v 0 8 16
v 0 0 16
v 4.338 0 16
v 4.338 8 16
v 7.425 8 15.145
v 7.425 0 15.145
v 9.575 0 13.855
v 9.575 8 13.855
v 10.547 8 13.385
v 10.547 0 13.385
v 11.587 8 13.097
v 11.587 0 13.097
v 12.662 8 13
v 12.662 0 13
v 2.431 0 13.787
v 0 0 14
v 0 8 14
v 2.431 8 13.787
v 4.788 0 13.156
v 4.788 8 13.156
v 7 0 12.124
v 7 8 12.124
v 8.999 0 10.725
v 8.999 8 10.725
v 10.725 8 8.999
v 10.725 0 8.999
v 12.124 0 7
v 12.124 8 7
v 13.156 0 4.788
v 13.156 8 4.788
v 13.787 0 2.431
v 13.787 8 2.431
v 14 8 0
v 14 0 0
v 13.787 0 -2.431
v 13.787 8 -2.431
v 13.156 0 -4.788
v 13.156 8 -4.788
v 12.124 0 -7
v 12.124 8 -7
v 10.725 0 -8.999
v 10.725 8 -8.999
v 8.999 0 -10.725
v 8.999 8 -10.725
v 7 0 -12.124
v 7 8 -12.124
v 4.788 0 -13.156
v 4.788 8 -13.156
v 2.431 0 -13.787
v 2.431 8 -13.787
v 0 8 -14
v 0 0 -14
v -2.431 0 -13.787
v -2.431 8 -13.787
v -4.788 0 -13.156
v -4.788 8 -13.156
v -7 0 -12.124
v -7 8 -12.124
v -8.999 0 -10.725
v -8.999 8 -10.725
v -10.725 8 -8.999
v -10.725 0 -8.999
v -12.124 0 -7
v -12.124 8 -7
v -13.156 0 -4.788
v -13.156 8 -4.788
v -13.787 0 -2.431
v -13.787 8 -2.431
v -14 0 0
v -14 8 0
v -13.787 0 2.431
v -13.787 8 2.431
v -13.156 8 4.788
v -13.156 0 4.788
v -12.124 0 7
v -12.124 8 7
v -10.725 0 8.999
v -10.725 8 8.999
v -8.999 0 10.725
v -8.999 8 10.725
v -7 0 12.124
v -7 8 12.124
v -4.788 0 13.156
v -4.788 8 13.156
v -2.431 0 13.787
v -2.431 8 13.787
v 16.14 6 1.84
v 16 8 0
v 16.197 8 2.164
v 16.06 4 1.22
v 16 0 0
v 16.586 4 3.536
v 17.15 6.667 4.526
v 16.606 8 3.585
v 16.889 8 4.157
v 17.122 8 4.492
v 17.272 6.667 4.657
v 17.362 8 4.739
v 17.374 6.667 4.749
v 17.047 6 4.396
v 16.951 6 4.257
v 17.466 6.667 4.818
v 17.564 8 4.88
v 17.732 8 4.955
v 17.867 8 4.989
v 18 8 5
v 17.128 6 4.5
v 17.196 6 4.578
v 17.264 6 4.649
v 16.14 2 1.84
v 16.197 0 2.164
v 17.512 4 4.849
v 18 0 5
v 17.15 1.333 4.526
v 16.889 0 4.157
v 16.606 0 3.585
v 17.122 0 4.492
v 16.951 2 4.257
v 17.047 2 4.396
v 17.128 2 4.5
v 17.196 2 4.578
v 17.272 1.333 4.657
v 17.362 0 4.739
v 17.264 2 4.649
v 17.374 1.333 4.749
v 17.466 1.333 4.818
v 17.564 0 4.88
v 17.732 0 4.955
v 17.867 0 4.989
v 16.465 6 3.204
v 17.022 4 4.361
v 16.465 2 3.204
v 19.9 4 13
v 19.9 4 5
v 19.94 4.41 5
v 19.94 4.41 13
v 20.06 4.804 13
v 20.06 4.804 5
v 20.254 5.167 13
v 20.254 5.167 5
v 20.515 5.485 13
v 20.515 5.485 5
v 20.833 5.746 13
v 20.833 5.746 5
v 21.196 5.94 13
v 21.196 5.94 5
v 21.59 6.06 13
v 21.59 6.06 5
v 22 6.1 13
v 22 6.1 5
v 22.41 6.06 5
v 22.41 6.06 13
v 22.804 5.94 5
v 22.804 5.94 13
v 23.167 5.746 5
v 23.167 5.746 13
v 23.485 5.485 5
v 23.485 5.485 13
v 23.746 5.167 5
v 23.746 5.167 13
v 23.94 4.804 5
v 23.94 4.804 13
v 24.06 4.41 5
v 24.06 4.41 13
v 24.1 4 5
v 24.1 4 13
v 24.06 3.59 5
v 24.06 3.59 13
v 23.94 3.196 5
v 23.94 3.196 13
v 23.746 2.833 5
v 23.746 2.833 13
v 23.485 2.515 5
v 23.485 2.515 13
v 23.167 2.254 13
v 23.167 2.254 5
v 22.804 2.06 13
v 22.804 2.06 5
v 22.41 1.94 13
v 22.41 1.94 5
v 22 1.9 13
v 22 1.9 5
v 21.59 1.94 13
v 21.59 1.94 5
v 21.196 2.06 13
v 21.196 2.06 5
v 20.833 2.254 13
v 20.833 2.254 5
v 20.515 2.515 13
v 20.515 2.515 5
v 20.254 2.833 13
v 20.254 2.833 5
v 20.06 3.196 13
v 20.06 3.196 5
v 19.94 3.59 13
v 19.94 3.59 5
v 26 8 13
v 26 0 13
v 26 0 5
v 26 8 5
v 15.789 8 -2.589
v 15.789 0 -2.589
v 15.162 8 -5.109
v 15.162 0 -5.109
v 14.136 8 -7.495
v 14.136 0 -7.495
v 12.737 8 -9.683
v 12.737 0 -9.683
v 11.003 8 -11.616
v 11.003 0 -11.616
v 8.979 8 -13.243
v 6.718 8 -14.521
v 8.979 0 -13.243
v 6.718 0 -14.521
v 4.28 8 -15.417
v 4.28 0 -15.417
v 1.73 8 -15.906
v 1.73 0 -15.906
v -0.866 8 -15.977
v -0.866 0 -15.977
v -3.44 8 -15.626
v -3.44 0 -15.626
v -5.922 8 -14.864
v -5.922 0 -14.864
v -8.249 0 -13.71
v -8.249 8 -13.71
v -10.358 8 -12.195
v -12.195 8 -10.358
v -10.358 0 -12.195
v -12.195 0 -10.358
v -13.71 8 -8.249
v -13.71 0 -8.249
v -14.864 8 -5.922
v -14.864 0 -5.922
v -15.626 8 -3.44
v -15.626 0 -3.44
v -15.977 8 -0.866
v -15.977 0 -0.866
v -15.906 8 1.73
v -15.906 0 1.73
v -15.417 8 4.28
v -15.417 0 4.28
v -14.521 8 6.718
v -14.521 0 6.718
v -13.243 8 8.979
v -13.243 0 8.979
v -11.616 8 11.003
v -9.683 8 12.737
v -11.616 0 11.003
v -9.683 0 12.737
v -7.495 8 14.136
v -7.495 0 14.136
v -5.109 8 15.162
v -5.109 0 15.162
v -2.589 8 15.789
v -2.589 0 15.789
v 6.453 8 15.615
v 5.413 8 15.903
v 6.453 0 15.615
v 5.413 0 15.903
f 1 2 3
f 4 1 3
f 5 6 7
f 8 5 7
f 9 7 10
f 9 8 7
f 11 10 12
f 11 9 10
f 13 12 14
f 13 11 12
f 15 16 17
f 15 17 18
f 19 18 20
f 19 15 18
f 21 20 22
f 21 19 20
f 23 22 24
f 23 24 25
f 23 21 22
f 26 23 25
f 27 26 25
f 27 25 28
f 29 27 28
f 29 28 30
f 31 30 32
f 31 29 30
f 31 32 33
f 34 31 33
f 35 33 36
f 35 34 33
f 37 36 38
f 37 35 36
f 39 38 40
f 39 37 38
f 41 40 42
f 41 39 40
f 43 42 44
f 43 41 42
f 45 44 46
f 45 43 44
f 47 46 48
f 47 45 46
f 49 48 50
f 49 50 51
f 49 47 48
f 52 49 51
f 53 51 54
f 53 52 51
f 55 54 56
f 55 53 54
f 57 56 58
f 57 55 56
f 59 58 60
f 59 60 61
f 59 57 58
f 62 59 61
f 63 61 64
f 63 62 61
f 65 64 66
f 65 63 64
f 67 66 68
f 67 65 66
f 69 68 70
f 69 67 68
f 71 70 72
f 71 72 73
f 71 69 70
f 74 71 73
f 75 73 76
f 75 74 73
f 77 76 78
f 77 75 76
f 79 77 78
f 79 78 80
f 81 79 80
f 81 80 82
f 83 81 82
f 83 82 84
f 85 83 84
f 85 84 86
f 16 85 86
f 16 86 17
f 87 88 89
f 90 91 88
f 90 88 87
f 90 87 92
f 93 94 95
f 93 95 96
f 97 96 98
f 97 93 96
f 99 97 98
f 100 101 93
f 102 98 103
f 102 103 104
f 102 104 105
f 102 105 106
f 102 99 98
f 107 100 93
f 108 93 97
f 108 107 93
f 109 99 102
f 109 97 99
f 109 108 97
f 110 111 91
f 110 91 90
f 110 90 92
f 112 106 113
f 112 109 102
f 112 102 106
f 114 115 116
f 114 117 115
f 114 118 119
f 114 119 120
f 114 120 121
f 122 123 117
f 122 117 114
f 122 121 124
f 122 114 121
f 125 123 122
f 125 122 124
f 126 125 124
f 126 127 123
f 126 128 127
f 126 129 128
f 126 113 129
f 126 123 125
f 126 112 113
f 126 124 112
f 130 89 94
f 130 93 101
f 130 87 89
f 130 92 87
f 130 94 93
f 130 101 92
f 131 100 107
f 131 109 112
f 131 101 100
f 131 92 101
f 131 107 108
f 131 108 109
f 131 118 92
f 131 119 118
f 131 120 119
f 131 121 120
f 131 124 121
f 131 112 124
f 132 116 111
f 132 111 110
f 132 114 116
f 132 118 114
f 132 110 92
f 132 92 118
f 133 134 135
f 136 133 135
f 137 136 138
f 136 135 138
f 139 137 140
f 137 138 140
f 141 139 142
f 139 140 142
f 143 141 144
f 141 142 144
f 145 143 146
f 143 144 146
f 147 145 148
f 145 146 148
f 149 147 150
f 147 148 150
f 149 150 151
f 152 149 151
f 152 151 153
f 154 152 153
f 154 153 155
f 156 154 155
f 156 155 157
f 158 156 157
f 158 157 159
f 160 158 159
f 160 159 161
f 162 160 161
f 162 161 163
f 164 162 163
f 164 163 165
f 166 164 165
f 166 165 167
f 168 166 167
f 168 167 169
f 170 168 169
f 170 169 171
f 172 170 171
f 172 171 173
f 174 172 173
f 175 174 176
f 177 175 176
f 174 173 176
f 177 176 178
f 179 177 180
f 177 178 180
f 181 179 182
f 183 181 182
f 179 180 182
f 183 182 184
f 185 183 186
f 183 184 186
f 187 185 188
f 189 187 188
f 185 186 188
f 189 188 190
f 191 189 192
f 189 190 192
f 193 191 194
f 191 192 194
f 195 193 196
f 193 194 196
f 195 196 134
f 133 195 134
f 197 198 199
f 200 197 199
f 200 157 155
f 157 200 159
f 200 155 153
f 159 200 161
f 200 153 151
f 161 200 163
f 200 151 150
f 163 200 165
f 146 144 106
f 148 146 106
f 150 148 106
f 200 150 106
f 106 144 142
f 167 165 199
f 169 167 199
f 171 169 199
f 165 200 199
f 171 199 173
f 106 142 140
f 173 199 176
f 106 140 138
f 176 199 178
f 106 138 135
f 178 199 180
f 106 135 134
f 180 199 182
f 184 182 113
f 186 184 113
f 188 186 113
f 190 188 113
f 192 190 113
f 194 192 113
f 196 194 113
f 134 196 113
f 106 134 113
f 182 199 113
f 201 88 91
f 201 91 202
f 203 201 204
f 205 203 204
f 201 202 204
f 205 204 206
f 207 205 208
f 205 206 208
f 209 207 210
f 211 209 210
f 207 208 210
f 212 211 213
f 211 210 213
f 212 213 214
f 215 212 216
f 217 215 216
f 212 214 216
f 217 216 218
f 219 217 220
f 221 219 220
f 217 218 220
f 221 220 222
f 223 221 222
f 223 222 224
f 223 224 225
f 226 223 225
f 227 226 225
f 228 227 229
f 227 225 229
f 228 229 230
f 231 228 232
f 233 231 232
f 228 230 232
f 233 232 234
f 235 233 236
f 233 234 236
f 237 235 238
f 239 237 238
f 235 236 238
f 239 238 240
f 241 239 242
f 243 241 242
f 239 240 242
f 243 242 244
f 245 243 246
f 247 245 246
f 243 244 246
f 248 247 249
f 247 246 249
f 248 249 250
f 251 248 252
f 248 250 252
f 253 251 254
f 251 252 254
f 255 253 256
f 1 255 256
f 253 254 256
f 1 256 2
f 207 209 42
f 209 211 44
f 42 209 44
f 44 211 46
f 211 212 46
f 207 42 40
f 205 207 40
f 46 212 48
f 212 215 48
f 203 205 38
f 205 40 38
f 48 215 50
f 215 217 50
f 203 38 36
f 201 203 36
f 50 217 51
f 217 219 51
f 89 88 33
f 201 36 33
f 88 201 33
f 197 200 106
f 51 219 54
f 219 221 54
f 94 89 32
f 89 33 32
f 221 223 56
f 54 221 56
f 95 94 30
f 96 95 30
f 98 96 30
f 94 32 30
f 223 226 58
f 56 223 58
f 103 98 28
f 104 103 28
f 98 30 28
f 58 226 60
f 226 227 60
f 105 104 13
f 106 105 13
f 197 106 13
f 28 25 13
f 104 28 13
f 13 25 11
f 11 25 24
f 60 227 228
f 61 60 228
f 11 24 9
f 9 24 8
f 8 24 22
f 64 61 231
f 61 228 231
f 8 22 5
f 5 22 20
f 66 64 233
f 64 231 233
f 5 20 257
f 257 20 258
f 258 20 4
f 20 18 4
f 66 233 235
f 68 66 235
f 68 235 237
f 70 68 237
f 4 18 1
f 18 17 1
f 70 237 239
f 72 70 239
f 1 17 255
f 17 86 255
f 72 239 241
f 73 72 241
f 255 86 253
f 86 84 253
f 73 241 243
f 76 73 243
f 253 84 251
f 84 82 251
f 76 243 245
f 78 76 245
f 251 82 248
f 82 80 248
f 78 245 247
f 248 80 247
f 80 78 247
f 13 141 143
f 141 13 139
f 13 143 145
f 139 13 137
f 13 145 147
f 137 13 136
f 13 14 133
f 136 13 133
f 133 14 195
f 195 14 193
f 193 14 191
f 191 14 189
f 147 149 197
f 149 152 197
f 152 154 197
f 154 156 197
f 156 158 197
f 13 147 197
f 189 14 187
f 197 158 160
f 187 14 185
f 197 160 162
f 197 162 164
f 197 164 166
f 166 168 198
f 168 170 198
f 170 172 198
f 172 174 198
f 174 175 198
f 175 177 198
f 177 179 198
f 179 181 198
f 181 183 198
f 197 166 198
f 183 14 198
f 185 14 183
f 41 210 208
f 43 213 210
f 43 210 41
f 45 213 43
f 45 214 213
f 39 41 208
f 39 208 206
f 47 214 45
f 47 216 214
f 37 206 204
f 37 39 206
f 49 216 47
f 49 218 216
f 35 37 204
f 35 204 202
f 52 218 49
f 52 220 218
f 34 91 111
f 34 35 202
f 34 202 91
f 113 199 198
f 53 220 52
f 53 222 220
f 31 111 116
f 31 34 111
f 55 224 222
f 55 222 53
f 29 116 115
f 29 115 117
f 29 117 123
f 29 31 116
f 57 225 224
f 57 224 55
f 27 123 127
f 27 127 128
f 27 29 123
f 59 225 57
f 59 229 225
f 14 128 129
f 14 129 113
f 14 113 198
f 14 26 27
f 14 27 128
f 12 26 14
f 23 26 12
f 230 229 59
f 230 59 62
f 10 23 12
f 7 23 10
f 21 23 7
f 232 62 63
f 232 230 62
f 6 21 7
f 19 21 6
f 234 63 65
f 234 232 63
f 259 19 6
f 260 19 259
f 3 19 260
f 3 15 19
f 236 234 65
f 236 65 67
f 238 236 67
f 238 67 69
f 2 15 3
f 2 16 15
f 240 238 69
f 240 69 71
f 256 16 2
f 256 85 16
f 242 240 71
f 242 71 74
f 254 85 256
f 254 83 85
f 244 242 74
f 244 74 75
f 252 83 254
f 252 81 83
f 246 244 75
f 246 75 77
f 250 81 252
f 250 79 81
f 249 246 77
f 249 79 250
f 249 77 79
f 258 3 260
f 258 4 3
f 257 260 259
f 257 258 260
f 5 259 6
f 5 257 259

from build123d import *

# Parameters (mm, degrees)
SKETCH1_R           = 14
BOSS_EXTRUDE1_DEPTH = 8
FILLET2_R           = 6
SKETCH2_R           = 2.1
CUT_EXTRUDE1_DEPTH  = 35.365680555
FILLET3_SIZE        = 5
FILLET3_SIZE_2      = 2


with BuildPart() as part:
    # Sketch1 → Boss-Extrude1 (new body)
    with BuildSketch(Plane(origin=(0, 0, 0), x_dir=(1, 0, 0), z_dir=(0, 1, 0))):
        with BuildLine():
            Line((0, -16), (6, -16))
            Line((6, -16), (11, -13))
            Line((11, -13), (26, -13))
            Line((26, -13), (26, -5))
            Line((26, -5), (16, -5))
            Line((16, -5), (16, 0))
            ThreePointArc((16, 0), (-11.313708499, 11.313708499), (0, -16))
        make_face()
        with Locations(Location((0, 0, 0), (0, 0, 270))):
            Circle(SKETCH1_R, mode=Mode.SUBTRACT)
    extrude(amount=BOSS_EXTRUDE1_DEPTH)

    # Fillet2
    fillet2_edges = [part.edges().sort_by_distance(p)[0] for p in [
        (11, 4, 13),
        (6, 4, 16),
    ]]
    fillet(fillet2_edges, radius=FILLET2_R)

    # Sketch2 → Cut-Extrude1 (cut, through all)
    with BuildSketch(Plane(origin=(0, 0, 5), x_dir=(-1, 0, 0), z_dir=(0, 0, -1))):
        with Locations((-22, 4)):
            Circle(SKETCH2_R)
    extrude(amount=-CUT_EXTRUDE1_DEPTH, mode=Mode.SUBTRACT)

    # Fillet3
    # an asymmetric fillet: 5, 2 mm, written as the material it adds along each edge
    with BuildSketch(Plane(origin=(16, 0, 5), x_dir=(0, 0, -1), z_dir=(0, 1, 0))) as fillet3_piece_1:
        with BuildLine():
            Bezier((FILLET3_SIZE, 0), (0, 0), (0, -FILLET3_SIZE_2), weights=[1, 0.707106781, 1])
            Line((0, -FILLET3_SIZE_2), (0, 0))
            Line((0, 0), (FILLET3_SIZE, 0))
        make_face()
    extrude(amount=8)


solid = part.part
